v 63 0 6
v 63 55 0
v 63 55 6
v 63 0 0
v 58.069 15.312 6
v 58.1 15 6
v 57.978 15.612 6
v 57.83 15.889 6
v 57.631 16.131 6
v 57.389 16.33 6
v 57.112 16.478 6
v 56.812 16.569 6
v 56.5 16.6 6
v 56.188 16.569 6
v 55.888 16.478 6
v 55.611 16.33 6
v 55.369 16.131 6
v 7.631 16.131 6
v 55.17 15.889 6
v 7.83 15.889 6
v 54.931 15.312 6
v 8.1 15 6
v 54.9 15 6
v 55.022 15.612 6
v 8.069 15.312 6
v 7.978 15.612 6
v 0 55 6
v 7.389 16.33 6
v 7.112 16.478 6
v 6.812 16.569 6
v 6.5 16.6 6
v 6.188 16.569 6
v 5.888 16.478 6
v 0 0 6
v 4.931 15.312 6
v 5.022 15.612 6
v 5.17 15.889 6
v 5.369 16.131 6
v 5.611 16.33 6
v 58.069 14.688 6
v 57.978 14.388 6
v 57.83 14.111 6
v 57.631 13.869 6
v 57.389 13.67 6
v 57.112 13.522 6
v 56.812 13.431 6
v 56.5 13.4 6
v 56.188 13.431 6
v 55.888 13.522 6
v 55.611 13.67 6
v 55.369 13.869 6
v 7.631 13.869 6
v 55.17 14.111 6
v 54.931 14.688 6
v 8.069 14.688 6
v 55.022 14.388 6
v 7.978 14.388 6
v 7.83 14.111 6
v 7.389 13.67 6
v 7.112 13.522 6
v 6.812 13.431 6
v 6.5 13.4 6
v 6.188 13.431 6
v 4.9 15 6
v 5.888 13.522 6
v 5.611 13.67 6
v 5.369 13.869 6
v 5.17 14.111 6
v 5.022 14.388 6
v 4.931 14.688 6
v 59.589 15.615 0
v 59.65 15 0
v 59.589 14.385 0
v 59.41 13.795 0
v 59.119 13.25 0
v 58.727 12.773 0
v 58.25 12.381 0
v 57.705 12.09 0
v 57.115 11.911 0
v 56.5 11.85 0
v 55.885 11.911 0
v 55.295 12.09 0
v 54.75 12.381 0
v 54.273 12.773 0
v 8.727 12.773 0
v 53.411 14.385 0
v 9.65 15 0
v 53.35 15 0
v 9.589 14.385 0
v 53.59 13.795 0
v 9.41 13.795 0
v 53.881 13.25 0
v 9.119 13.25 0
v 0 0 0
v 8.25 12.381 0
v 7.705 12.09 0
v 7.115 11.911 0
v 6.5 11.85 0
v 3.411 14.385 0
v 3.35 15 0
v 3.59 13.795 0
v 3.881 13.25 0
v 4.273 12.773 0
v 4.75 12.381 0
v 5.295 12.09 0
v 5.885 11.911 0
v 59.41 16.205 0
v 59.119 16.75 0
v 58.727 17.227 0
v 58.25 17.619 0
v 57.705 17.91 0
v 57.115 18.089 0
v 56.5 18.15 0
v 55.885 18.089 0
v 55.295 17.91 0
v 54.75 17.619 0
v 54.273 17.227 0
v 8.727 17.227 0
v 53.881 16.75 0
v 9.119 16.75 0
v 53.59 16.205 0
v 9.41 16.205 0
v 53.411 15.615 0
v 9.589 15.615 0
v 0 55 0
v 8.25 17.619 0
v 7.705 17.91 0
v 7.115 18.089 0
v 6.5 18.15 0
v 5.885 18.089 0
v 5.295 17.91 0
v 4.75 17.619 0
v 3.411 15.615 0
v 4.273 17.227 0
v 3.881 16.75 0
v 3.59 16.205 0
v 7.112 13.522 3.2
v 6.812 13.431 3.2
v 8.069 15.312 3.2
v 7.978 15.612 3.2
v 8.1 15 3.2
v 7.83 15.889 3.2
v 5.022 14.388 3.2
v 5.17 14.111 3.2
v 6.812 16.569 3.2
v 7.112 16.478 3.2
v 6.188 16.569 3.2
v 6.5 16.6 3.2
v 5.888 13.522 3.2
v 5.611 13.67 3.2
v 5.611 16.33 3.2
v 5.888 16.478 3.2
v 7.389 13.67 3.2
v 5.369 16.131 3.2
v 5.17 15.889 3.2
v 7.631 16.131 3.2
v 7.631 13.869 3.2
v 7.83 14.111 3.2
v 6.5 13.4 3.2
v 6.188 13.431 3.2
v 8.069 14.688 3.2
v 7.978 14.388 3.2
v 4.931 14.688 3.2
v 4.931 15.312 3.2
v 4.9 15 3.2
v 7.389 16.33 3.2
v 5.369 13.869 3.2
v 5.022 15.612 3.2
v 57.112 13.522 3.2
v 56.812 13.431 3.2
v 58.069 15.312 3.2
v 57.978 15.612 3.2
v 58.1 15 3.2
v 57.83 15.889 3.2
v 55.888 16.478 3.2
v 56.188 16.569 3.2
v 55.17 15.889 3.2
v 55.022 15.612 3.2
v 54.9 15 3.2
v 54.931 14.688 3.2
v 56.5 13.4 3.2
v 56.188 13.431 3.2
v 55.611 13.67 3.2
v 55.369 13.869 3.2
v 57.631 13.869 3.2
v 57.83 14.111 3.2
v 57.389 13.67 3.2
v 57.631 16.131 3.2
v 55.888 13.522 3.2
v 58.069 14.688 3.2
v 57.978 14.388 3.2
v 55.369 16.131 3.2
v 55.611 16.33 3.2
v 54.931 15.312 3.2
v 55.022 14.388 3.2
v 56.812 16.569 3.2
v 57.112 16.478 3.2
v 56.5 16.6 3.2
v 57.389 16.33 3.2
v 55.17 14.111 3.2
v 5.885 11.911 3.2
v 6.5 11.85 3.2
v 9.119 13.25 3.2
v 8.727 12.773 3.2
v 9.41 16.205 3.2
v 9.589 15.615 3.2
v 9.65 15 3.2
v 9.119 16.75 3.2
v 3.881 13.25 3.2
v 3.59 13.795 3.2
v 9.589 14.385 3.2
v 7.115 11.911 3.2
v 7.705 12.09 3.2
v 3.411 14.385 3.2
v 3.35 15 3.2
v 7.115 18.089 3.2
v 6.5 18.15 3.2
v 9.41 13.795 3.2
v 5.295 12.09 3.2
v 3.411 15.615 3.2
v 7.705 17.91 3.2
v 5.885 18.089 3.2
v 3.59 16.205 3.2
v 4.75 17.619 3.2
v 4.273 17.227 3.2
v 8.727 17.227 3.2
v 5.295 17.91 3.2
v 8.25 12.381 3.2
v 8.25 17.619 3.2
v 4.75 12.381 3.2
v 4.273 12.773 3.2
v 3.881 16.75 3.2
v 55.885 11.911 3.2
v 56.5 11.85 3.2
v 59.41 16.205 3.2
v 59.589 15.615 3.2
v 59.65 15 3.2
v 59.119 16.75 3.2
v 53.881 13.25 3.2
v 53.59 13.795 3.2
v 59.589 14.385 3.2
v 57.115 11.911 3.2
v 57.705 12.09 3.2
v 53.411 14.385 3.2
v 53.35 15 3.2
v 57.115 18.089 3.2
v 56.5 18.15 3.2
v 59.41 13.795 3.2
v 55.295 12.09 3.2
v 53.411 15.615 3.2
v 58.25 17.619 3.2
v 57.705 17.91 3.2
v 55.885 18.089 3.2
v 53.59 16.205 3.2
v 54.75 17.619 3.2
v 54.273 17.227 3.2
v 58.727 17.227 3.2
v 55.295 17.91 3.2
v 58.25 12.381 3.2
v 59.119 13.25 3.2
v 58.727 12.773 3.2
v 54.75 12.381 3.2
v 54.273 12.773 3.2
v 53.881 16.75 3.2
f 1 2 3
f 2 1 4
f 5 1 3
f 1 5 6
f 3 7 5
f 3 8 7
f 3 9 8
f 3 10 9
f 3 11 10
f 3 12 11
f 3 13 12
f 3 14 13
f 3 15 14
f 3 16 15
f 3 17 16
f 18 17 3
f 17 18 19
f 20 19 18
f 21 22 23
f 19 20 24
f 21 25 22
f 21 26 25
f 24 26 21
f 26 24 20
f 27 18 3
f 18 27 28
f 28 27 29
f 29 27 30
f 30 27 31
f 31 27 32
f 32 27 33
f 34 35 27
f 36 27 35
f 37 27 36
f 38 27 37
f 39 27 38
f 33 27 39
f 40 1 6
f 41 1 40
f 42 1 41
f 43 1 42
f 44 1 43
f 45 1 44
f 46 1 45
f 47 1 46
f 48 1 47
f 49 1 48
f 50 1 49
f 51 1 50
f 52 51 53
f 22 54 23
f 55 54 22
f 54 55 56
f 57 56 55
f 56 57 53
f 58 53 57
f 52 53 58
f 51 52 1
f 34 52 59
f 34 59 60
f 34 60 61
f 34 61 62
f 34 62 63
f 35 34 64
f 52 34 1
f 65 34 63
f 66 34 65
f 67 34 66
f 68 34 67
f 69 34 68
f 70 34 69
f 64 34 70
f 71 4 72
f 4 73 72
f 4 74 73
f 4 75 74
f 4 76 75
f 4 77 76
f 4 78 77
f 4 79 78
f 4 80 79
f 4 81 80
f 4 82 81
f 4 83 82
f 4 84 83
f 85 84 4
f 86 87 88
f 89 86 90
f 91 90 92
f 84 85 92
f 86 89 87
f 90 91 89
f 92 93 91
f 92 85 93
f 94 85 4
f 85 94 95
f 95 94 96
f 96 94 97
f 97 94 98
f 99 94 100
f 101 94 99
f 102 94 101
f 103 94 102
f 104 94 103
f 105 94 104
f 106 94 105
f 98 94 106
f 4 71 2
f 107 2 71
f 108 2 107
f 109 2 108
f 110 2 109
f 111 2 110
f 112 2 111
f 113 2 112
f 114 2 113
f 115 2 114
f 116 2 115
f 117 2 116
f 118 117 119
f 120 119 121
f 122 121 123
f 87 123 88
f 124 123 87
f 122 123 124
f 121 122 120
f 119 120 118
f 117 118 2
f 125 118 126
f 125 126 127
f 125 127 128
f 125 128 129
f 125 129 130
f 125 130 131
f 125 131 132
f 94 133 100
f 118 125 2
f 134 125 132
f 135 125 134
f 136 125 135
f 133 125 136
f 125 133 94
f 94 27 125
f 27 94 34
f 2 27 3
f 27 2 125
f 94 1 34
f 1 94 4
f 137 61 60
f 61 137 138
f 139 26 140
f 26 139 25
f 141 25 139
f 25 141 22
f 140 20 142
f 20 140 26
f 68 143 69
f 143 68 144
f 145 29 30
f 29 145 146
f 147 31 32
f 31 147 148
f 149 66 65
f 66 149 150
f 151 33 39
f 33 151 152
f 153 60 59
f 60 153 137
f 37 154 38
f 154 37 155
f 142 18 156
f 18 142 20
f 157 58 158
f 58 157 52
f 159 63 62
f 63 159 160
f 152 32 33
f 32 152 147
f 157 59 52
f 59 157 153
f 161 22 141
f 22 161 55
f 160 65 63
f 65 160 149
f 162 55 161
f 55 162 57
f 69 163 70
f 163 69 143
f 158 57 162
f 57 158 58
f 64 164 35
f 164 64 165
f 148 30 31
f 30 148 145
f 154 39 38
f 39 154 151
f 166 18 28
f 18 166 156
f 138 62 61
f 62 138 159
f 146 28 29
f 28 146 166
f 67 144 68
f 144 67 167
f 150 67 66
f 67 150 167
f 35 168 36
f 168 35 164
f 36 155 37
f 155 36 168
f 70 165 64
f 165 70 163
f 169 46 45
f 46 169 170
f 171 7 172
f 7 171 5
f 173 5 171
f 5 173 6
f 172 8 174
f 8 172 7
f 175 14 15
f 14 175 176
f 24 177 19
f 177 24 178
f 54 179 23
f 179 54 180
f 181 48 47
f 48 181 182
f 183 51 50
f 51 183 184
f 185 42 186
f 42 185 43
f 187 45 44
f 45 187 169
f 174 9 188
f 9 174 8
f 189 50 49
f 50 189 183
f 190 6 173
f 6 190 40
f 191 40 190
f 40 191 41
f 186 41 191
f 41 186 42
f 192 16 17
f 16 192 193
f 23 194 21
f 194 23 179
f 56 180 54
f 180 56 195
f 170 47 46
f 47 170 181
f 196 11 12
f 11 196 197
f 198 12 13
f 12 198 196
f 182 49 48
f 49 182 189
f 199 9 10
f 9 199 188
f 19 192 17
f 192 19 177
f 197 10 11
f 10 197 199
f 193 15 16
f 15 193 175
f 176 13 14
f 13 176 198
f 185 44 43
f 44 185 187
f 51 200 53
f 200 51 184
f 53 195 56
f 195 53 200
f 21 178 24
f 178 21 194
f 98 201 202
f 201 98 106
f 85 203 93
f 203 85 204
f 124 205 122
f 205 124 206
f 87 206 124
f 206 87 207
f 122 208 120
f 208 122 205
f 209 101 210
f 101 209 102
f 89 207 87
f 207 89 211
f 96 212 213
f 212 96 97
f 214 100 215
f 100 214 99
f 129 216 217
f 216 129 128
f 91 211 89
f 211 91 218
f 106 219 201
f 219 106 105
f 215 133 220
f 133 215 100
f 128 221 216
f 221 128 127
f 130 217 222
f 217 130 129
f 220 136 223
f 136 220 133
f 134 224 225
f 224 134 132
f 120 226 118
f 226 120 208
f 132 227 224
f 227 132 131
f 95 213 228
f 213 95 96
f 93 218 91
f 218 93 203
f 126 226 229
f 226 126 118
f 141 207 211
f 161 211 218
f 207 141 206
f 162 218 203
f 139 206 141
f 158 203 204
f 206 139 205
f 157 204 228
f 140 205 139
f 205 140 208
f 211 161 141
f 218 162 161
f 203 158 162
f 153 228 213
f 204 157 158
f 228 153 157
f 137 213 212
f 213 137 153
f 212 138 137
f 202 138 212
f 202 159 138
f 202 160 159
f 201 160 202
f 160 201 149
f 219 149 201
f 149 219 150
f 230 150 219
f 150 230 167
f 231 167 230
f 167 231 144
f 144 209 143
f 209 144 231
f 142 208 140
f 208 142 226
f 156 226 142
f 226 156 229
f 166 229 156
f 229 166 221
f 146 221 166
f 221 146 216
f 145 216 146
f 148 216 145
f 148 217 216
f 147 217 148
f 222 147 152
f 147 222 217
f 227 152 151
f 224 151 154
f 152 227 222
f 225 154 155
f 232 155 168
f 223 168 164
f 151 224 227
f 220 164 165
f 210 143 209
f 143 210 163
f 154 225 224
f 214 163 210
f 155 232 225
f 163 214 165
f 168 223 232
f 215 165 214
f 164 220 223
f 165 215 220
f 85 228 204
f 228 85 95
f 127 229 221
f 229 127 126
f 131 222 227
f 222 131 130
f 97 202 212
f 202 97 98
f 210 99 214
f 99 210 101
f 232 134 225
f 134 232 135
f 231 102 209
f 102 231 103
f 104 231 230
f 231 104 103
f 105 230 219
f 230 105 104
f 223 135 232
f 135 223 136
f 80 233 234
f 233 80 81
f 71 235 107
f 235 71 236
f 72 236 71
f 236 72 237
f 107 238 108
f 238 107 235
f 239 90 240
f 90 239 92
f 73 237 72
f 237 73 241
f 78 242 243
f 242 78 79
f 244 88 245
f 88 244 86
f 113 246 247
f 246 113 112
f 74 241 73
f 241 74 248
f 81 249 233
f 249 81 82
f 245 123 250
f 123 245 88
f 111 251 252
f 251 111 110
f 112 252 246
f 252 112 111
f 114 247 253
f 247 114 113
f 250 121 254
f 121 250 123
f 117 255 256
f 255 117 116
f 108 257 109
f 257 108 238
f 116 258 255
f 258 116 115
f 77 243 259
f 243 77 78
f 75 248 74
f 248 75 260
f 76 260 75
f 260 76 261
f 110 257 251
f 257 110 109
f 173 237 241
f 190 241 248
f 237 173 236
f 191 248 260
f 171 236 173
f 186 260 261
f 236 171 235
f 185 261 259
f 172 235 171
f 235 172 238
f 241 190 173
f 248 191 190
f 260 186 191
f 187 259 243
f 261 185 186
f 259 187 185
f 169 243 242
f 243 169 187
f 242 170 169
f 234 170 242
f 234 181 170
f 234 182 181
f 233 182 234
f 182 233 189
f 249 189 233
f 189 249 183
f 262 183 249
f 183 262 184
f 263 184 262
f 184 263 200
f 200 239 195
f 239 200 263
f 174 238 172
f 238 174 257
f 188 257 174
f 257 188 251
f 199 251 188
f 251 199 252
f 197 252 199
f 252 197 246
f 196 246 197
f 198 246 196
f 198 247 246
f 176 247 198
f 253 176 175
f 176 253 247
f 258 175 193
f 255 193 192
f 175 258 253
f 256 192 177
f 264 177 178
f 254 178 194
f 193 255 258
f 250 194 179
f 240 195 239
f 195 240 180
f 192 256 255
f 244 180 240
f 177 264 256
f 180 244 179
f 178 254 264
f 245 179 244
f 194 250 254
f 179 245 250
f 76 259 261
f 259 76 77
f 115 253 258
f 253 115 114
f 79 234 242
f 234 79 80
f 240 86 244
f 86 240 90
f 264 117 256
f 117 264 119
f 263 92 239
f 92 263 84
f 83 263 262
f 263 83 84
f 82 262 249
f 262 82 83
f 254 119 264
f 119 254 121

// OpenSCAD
board_width = 63;
board_length = 55;
board_height = 6.0;
hole_diameter = 3.2;
screw_head_diameter_with_margin = 6.3;
screw_head_depth_with_margin = 3.2;

hole_ypos = 15;
hole_interval = 50;
hole1_pos = [(board_width - hole_interval) * 0.5, hole_ypos];
hole2_pos = [(board_width + hole_interval) * 0.5, hole_ypos];

difference() {
    cube([board_width, board_length, board_height]);
    translate([hole1_pos[0], hole1_pos[1], 0]){
        cylinder(h = board_height, d = hole_diameter, $fn = 32);
    }
    translate([hole2_pos[0], hole2_pos[1], 0]){
        cylinder(h = board_height, d = hole_diameter, $fn = 32);
    }
    translate([hole1_pos[0], hole1_pos[1], 0]){
        cylinder(h = screw_head_depth_with_margin, d = screw_head_diameter_with_margin, $fn = 32);
    }
    translate([hole2_pos[0], hole2_pos[1], 0]){
        cylinder(h = screw_head_depth_with_margin, d = screw_head_diameter_with_margin, $fn = 32);
    }

}
